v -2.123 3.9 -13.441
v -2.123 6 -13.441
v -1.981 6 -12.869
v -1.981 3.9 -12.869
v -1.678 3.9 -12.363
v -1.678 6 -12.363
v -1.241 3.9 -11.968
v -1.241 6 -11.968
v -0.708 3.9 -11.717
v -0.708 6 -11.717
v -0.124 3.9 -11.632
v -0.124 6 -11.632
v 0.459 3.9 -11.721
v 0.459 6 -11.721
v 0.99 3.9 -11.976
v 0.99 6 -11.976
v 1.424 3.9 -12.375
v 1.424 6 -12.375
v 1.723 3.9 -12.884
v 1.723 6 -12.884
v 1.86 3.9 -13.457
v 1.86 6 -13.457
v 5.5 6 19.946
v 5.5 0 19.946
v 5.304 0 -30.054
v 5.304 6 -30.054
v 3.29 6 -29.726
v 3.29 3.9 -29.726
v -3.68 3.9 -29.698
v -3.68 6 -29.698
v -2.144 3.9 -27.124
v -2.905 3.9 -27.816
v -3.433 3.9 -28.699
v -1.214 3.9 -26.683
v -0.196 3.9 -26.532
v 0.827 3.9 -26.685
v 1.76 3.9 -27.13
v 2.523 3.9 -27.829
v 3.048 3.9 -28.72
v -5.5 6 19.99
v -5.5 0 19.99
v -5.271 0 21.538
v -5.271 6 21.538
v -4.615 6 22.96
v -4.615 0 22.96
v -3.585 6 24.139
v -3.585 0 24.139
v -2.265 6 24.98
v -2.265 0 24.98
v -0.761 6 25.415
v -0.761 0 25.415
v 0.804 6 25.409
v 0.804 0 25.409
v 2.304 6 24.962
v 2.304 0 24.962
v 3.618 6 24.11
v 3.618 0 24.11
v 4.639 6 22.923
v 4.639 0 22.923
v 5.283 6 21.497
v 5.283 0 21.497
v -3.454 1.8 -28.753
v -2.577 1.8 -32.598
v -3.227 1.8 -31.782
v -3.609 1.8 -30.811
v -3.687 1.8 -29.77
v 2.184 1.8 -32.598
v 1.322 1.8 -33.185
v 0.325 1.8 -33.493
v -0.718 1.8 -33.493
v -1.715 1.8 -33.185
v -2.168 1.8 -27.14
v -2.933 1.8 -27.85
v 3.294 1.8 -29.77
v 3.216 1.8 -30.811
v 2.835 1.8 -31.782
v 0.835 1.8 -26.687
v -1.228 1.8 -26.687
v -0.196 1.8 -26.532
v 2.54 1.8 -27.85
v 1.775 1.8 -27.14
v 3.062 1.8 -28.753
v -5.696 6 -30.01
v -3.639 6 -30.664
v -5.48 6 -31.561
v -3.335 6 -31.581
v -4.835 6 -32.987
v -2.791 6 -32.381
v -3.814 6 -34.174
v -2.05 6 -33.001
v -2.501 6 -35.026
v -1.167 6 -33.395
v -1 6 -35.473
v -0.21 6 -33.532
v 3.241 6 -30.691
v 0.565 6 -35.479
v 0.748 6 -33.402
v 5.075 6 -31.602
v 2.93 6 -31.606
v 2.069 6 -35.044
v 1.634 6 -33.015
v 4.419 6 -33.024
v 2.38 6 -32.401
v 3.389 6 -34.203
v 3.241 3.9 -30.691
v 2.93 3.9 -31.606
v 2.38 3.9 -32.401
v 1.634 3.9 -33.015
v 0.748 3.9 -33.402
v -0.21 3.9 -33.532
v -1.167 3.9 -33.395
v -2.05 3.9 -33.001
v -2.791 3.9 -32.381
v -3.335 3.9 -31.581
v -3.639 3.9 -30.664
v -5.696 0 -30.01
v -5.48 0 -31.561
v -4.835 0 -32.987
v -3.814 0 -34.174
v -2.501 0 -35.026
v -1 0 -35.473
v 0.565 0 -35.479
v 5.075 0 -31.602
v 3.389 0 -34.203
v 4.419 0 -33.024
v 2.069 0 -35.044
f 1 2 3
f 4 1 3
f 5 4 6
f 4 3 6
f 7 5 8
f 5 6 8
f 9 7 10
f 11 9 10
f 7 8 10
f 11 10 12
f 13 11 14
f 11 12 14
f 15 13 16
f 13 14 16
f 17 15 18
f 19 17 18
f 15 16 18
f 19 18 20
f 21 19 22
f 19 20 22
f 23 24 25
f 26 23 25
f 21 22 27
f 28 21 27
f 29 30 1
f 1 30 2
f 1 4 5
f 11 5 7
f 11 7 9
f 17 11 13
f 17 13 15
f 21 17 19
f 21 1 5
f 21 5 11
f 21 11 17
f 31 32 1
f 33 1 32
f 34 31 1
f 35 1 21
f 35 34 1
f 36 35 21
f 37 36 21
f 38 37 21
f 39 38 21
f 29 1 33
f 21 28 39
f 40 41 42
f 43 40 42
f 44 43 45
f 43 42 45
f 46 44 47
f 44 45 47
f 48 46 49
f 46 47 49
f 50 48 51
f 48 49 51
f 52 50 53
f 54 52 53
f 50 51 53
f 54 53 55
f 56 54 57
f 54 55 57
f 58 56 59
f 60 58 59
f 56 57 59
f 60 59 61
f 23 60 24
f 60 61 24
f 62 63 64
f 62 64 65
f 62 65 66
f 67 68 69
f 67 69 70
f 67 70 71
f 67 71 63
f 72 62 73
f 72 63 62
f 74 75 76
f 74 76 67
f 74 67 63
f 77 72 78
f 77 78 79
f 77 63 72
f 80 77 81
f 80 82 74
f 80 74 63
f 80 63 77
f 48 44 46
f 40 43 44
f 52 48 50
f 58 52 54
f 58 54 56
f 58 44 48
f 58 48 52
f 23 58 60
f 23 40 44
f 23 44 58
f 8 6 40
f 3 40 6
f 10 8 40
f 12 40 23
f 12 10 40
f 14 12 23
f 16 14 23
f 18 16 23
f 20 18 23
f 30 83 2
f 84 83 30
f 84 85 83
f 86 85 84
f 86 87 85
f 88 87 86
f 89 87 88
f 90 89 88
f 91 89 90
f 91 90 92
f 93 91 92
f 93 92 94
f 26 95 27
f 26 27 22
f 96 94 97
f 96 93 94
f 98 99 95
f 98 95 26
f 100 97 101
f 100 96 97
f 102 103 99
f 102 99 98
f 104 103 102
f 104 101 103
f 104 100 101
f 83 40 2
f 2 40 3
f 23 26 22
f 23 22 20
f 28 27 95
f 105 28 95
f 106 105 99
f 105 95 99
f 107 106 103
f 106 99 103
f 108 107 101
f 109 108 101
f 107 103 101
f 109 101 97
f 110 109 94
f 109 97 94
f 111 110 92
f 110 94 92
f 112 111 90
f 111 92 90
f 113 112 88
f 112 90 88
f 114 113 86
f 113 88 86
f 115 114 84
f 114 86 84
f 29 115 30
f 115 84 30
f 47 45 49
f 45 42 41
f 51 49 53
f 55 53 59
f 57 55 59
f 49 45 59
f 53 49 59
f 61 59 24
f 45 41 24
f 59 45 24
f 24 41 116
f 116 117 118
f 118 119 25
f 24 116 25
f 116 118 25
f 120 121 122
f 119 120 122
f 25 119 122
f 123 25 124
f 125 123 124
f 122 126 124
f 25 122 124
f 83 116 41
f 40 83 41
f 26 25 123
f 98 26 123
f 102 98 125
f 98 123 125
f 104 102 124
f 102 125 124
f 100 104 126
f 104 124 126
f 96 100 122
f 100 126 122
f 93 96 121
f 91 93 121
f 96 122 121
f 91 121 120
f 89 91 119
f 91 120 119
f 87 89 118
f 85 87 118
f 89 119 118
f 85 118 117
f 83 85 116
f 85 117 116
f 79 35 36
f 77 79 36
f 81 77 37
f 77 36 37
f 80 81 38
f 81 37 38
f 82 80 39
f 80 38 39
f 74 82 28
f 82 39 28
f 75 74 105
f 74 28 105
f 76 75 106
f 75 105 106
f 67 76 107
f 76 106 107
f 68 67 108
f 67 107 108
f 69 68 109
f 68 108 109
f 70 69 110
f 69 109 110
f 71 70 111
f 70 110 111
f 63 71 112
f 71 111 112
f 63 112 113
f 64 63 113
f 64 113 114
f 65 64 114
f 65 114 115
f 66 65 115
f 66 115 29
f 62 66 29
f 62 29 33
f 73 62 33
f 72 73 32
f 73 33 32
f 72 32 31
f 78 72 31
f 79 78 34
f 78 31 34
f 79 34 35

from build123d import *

# Parameters (mm, degrees)
EXTRUDE_1_DEPTH     = 6
CUT_EXTRUDE_1_DEPTH = 2.1
SKETCH_4_R          = 3.5
CUT_EXTRUDE_2_DEPTH = 2.1


with BuildPart() as part:
    # Эскиз2 → Бобышка-Вытянуть1 (new body)
    with BuildSketch(Plane(origin=(0, 0, 0), x_dir=(1, 0, 0), z_dir=(0, 1, 0))):
        with BuildLine():
            Line((-5.696343687, 30.010357476), (-5.499915116, -19.989642524))
            ThreePointArc((-5.499915116, -19.989642524), (0.021649418, -25.467993105), (5.5, -19.946428571))
            Line((5.5, -19.946428571), (5.303571429, 30.053571429))
            ThreePointArc((5.303571429, 30.053571429), (-0.217993105, 35.53192201), (-5.696343687, 30.010357476))
        make_face()
    extrude(amount=EXTRUDE_1_DEPTH)

    # Эскиз3 → Вырез-Вытянуть1 (cut)
    with BuildSketch(Plane(origin=(0, 6, 0), x_dir=(1, 0, 0), z_dir=(0, 1, 0))):
        with BuildLine():
            Line((-3.680431468, 29.698156009), (-2.122840442, 13.441174328))
            ThreePointArc((-2.122840442, 13.441174328), (-0.124100309, 11.631937444), (1.860362916, 13.456822627))
            Line((1.860362916, 13.456822627), (3.290174408, 29.725540532))
            ThreePointArc((3.290174408, 29.725540532), (-0.210136023, 33.531937444), (-3.680431468, 29.698156009))
        make_face()
    extrude(amount=-CUT_EXTRUDE_1_DEPTH, mode=Mode.SUBTRACT)

    # Эскиз4 → Вырез-Вытянуть2 (cut)
    with BuildSketch(Plane(origin=(0, 3.9, 0), x_dir=(1, 0, 0), z_dir=(0, 1, 0))):
        with Locations(Location((-0.196386129, 30.031964452, 0), (0, 0, 270))):
            Circle(SKETCH_4_R)
    extrude(amount=-CUT_EXTRUDE_2_DEPTH, mode=Mode.SUBTRACT)


solid = part.part
